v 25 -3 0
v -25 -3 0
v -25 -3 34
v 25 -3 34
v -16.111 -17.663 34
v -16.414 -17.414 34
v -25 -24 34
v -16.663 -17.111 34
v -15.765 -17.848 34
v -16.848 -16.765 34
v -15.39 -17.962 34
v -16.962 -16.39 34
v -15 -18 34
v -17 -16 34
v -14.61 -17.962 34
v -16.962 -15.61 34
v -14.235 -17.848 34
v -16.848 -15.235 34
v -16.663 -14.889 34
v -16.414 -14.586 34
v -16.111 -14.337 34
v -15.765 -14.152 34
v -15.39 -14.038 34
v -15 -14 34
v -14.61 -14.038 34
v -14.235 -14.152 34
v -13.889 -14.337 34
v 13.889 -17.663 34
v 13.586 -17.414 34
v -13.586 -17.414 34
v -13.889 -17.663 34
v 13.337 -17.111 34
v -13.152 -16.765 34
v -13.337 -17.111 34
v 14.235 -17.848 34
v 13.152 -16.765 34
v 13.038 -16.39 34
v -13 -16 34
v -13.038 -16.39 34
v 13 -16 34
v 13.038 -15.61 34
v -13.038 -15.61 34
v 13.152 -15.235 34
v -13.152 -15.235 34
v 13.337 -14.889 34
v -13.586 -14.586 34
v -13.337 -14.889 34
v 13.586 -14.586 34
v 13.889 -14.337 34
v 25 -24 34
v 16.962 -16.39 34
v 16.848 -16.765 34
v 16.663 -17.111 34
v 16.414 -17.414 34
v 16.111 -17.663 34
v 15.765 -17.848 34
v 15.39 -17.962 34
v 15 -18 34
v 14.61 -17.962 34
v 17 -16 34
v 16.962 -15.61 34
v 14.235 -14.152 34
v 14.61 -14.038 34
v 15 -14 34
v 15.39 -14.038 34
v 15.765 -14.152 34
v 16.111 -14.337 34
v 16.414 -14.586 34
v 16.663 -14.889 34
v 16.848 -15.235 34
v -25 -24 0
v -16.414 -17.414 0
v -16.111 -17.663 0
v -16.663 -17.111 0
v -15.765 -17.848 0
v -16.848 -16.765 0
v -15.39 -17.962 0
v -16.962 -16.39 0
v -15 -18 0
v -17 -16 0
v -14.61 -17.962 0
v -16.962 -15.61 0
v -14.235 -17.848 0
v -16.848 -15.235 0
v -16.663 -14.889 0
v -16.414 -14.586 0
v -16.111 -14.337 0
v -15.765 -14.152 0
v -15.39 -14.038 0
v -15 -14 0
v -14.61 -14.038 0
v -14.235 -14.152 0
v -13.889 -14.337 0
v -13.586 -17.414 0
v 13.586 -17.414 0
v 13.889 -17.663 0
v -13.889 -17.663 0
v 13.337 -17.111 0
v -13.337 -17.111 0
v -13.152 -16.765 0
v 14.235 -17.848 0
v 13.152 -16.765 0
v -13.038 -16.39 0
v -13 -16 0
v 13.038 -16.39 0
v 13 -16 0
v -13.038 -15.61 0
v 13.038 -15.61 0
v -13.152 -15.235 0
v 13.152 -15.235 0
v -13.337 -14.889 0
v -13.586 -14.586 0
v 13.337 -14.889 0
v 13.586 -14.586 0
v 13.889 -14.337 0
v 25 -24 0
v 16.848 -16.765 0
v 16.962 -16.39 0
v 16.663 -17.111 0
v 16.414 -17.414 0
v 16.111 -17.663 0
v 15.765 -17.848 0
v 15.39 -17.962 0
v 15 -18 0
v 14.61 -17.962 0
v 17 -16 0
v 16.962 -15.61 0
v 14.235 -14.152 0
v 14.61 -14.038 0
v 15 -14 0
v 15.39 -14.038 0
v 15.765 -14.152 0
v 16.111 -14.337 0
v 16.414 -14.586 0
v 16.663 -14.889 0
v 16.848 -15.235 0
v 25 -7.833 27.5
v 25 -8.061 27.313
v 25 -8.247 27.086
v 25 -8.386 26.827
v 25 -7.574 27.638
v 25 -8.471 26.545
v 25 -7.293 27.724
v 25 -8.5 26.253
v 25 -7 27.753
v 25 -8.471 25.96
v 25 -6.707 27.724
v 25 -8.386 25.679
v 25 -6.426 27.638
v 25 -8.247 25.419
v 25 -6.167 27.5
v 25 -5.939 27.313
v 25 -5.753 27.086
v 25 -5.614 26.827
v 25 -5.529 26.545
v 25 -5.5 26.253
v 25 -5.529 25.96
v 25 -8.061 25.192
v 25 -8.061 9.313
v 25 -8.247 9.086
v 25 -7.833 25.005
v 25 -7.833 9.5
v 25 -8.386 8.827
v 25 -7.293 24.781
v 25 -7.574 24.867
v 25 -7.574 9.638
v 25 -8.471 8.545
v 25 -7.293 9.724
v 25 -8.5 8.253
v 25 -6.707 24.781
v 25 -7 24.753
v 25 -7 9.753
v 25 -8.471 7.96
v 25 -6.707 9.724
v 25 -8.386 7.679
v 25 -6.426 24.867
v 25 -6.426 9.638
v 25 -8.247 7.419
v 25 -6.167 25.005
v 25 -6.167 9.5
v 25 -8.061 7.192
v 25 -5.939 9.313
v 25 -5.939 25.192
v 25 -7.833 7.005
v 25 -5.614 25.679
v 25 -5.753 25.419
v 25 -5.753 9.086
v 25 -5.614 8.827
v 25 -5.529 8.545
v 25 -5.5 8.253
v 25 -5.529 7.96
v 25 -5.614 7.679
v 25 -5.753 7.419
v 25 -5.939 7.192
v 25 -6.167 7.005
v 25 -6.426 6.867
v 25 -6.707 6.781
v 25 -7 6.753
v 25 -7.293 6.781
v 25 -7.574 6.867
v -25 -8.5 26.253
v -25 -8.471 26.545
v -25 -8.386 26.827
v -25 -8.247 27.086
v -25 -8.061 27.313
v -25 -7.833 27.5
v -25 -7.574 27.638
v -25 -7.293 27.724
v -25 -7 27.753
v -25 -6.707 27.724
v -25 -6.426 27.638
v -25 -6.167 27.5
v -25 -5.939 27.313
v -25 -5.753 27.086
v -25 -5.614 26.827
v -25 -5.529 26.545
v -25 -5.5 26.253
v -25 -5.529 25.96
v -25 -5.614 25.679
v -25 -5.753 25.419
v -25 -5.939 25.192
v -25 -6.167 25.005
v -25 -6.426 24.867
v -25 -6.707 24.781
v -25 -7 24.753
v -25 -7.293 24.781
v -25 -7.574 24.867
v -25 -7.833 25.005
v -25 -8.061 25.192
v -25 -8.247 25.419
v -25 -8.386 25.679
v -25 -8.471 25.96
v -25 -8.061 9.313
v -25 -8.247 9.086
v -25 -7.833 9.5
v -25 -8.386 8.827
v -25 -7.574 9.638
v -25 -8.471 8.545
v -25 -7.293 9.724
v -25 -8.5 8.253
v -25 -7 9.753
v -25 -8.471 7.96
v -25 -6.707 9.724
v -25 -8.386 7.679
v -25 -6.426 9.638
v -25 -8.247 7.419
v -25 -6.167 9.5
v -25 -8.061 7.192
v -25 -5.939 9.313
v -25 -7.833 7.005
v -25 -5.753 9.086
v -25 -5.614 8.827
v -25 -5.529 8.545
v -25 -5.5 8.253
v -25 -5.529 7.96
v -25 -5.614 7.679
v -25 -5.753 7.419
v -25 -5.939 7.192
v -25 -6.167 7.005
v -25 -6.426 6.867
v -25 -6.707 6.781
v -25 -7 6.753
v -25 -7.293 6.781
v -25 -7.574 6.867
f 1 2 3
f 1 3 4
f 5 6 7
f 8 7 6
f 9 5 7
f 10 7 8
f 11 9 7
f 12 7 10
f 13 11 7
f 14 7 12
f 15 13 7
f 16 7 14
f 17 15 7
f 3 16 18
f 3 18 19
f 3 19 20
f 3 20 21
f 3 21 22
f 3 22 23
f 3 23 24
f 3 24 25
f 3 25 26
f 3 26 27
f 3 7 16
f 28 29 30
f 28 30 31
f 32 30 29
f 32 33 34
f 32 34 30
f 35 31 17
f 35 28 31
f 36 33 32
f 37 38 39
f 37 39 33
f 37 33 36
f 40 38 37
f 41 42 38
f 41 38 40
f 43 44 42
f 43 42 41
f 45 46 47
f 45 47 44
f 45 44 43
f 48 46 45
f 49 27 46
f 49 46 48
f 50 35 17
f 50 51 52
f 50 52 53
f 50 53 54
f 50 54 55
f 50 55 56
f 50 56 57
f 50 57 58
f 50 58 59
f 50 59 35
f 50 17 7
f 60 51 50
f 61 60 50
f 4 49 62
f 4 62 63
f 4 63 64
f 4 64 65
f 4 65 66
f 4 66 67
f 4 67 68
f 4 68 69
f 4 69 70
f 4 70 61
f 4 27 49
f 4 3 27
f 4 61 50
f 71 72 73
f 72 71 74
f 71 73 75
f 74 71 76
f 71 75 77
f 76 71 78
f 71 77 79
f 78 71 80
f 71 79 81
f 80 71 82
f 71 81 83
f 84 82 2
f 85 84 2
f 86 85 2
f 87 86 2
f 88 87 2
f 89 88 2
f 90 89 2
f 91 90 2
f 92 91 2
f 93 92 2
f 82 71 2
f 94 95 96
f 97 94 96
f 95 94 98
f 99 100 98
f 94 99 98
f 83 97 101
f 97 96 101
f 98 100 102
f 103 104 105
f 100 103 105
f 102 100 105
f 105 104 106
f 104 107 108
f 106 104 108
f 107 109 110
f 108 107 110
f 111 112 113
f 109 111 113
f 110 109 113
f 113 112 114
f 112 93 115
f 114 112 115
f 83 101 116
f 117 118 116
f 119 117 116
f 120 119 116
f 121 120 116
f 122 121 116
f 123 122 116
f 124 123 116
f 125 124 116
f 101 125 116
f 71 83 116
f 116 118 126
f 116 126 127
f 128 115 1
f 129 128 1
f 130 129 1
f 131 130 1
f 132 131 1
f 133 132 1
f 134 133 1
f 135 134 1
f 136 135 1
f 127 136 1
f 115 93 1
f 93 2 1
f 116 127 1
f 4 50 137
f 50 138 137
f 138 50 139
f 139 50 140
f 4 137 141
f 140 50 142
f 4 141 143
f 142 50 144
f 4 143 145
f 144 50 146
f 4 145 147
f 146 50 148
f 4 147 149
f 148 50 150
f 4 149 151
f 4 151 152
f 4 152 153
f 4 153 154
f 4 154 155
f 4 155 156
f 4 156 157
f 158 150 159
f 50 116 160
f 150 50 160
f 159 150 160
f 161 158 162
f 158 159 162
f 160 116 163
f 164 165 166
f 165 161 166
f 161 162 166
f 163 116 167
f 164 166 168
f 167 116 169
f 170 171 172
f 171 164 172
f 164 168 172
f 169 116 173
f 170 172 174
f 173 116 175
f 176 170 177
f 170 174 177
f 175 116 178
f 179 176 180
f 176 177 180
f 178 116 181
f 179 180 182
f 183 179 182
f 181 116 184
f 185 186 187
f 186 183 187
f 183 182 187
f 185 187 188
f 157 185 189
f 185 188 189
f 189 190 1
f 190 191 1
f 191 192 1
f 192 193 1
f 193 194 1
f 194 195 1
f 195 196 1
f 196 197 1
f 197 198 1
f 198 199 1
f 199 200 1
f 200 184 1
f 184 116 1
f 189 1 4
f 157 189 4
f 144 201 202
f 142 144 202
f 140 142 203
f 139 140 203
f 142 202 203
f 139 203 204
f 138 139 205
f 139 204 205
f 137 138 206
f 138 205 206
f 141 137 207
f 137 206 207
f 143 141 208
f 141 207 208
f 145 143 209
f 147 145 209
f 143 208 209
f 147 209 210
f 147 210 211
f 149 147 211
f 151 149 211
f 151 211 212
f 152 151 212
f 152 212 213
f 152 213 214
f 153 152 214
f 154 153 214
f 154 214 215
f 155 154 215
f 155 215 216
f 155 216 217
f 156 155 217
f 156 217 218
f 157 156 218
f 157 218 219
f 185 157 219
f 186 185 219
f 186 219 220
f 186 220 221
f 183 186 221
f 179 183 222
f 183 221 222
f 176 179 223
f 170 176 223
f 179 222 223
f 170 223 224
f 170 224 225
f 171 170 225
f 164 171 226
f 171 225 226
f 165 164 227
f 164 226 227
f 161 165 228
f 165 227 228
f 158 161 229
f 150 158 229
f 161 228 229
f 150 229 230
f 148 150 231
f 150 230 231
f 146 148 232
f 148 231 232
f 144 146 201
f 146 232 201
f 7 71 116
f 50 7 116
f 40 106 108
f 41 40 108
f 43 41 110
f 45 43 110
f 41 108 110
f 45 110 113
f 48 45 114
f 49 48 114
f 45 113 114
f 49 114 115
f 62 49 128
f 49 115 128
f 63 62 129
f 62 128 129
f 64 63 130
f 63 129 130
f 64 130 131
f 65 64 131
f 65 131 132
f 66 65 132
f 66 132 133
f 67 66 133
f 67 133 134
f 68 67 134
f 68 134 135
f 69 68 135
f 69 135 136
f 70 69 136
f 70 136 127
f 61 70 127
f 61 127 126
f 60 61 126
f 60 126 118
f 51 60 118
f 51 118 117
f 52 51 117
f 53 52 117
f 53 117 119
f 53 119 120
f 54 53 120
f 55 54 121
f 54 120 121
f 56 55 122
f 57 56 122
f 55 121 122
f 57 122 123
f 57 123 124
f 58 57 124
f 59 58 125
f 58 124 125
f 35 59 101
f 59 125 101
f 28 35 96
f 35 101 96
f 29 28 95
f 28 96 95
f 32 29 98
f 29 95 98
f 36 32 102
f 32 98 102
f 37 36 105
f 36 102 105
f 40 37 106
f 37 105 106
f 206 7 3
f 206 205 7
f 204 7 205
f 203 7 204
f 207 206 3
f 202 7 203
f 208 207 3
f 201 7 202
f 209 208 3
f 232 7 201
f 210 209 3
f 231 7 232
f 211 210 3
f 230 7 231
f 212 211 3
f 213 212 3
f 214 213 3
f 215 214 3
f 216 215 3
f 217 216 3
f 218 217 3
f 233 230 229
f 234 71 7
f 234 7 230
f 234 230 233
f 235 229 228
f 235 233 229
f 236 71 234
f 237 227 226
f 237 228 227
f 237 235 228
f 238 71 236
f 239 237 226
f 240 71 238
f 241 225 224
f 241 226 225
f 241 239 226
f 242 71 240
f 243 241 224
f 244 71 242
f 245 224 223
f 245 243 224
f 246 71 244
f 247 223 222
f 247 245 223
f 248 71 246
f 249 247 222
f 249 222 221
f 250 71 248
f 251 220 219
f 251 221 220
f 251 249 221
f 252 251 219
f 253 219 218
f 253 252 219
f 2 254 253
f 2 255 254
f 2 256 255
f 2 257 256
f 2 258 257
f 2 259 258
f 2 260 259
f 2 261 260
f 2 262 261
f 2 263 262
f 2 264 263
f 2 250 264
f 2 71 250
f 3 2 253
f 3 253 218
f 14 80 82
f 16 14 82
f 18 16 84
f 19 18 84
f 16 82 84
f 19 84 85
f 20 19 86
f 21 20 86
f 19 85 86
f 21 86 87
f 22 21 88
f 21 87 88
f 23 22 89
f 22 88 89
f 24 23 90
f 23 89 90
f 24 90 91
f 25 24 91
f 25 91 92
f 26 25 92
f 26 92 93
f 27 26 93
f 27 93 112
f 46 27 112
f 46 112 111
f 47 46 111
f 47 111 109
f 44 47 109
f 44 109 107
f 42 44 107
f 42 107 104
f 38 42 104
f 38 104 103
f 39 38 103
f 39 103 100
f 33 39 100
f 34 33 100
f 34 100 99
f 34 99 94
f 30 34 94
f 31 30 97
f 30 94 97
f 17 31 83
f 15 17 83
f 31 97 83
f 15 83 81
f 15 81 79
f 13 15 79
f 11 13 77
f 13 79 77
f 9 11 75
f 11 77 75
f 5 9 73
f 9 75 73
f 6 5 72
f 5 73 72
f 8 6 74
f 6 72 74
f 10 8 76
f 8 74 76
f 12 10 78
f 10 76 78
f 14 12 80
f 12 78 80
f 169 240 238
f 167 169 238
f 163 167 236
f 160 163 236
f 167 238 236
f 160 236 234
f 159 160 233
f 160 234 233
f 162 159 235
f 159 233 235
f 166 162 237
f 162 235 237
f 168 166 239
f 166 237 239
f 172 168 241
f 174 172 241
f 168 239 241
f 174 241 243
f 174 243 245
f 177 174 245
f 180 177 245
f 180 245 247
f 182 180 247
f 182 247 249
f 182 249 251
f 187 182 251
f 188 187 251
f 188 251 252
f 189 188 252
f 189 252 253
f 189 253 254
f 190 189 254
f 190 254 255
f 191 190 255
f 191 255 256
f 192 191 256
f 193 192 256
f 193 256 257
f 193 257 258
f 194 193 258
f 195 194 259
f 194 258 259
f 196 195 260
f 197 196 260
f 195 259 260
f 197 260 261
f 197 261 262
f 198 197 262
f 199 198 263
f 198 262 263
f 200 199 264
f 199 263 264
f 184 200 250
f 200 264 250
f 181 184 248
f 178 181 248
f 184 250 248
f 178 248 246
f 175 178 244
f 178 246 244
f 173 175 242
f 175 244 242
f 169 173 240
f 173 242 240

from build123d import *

# Parameters (mm, degrees)
SKETCH_1_W          = 50
SKETCH_1_H          = 21
EXTRUDE_1_DEPTH     = 34
SKETCH_2_R          = 2
CUT_EXTRUDE_1_DEPTH = 49.548944376
SKETCH_3_R          = 1.5
CUT_EXTRUDE_2_DEPTH = 66.053823869


with BuildPart() as part:
    # 草图1 → 凸台-拉伸1 (new body)
    with BuildSketch(Plane.XY):
        with Locations((0, -13.5)):
            Rectangle(SKETCH_1_W, SKETCH_1_H)
    extrude(amount=EXTRUDE_1_DEPTH)

    # 草图2 → 切除-拉伸1 (cut, through all)
    with BuildSketch(Plane(origin=(0, 0, 0), x_dir=(-1, 0, 0), z_dir=(0, 0, -1))):
        with Locations((-15, -16)):
            Circle(SKETCH_2_R)
        with Locations((15, -16)):
            Circle(SKETCH_2_R)
    extrude(amount=-CUT_EXTRUDE_1_DEPTH, mode=Mode.SUBTRACT)

    # 草图3 → 切除-拉伸2 (cut, through all)
    with BuildSketch(Plane.ZY.offset(25)):
        with Locations(Location((8.252553912, -7, 0), (0, 0, 270))):
            Circle(SKETCH_3_R)
        with Locations(Location((26.252553912, -7, 0), (0, 0, 270))):
            Circle(SKETCH_3_R)
    extrude(amount=-CUT_EXTRUDE_2_DEPTH, mode=Mode.SUBTRACT)


solid = part.part
